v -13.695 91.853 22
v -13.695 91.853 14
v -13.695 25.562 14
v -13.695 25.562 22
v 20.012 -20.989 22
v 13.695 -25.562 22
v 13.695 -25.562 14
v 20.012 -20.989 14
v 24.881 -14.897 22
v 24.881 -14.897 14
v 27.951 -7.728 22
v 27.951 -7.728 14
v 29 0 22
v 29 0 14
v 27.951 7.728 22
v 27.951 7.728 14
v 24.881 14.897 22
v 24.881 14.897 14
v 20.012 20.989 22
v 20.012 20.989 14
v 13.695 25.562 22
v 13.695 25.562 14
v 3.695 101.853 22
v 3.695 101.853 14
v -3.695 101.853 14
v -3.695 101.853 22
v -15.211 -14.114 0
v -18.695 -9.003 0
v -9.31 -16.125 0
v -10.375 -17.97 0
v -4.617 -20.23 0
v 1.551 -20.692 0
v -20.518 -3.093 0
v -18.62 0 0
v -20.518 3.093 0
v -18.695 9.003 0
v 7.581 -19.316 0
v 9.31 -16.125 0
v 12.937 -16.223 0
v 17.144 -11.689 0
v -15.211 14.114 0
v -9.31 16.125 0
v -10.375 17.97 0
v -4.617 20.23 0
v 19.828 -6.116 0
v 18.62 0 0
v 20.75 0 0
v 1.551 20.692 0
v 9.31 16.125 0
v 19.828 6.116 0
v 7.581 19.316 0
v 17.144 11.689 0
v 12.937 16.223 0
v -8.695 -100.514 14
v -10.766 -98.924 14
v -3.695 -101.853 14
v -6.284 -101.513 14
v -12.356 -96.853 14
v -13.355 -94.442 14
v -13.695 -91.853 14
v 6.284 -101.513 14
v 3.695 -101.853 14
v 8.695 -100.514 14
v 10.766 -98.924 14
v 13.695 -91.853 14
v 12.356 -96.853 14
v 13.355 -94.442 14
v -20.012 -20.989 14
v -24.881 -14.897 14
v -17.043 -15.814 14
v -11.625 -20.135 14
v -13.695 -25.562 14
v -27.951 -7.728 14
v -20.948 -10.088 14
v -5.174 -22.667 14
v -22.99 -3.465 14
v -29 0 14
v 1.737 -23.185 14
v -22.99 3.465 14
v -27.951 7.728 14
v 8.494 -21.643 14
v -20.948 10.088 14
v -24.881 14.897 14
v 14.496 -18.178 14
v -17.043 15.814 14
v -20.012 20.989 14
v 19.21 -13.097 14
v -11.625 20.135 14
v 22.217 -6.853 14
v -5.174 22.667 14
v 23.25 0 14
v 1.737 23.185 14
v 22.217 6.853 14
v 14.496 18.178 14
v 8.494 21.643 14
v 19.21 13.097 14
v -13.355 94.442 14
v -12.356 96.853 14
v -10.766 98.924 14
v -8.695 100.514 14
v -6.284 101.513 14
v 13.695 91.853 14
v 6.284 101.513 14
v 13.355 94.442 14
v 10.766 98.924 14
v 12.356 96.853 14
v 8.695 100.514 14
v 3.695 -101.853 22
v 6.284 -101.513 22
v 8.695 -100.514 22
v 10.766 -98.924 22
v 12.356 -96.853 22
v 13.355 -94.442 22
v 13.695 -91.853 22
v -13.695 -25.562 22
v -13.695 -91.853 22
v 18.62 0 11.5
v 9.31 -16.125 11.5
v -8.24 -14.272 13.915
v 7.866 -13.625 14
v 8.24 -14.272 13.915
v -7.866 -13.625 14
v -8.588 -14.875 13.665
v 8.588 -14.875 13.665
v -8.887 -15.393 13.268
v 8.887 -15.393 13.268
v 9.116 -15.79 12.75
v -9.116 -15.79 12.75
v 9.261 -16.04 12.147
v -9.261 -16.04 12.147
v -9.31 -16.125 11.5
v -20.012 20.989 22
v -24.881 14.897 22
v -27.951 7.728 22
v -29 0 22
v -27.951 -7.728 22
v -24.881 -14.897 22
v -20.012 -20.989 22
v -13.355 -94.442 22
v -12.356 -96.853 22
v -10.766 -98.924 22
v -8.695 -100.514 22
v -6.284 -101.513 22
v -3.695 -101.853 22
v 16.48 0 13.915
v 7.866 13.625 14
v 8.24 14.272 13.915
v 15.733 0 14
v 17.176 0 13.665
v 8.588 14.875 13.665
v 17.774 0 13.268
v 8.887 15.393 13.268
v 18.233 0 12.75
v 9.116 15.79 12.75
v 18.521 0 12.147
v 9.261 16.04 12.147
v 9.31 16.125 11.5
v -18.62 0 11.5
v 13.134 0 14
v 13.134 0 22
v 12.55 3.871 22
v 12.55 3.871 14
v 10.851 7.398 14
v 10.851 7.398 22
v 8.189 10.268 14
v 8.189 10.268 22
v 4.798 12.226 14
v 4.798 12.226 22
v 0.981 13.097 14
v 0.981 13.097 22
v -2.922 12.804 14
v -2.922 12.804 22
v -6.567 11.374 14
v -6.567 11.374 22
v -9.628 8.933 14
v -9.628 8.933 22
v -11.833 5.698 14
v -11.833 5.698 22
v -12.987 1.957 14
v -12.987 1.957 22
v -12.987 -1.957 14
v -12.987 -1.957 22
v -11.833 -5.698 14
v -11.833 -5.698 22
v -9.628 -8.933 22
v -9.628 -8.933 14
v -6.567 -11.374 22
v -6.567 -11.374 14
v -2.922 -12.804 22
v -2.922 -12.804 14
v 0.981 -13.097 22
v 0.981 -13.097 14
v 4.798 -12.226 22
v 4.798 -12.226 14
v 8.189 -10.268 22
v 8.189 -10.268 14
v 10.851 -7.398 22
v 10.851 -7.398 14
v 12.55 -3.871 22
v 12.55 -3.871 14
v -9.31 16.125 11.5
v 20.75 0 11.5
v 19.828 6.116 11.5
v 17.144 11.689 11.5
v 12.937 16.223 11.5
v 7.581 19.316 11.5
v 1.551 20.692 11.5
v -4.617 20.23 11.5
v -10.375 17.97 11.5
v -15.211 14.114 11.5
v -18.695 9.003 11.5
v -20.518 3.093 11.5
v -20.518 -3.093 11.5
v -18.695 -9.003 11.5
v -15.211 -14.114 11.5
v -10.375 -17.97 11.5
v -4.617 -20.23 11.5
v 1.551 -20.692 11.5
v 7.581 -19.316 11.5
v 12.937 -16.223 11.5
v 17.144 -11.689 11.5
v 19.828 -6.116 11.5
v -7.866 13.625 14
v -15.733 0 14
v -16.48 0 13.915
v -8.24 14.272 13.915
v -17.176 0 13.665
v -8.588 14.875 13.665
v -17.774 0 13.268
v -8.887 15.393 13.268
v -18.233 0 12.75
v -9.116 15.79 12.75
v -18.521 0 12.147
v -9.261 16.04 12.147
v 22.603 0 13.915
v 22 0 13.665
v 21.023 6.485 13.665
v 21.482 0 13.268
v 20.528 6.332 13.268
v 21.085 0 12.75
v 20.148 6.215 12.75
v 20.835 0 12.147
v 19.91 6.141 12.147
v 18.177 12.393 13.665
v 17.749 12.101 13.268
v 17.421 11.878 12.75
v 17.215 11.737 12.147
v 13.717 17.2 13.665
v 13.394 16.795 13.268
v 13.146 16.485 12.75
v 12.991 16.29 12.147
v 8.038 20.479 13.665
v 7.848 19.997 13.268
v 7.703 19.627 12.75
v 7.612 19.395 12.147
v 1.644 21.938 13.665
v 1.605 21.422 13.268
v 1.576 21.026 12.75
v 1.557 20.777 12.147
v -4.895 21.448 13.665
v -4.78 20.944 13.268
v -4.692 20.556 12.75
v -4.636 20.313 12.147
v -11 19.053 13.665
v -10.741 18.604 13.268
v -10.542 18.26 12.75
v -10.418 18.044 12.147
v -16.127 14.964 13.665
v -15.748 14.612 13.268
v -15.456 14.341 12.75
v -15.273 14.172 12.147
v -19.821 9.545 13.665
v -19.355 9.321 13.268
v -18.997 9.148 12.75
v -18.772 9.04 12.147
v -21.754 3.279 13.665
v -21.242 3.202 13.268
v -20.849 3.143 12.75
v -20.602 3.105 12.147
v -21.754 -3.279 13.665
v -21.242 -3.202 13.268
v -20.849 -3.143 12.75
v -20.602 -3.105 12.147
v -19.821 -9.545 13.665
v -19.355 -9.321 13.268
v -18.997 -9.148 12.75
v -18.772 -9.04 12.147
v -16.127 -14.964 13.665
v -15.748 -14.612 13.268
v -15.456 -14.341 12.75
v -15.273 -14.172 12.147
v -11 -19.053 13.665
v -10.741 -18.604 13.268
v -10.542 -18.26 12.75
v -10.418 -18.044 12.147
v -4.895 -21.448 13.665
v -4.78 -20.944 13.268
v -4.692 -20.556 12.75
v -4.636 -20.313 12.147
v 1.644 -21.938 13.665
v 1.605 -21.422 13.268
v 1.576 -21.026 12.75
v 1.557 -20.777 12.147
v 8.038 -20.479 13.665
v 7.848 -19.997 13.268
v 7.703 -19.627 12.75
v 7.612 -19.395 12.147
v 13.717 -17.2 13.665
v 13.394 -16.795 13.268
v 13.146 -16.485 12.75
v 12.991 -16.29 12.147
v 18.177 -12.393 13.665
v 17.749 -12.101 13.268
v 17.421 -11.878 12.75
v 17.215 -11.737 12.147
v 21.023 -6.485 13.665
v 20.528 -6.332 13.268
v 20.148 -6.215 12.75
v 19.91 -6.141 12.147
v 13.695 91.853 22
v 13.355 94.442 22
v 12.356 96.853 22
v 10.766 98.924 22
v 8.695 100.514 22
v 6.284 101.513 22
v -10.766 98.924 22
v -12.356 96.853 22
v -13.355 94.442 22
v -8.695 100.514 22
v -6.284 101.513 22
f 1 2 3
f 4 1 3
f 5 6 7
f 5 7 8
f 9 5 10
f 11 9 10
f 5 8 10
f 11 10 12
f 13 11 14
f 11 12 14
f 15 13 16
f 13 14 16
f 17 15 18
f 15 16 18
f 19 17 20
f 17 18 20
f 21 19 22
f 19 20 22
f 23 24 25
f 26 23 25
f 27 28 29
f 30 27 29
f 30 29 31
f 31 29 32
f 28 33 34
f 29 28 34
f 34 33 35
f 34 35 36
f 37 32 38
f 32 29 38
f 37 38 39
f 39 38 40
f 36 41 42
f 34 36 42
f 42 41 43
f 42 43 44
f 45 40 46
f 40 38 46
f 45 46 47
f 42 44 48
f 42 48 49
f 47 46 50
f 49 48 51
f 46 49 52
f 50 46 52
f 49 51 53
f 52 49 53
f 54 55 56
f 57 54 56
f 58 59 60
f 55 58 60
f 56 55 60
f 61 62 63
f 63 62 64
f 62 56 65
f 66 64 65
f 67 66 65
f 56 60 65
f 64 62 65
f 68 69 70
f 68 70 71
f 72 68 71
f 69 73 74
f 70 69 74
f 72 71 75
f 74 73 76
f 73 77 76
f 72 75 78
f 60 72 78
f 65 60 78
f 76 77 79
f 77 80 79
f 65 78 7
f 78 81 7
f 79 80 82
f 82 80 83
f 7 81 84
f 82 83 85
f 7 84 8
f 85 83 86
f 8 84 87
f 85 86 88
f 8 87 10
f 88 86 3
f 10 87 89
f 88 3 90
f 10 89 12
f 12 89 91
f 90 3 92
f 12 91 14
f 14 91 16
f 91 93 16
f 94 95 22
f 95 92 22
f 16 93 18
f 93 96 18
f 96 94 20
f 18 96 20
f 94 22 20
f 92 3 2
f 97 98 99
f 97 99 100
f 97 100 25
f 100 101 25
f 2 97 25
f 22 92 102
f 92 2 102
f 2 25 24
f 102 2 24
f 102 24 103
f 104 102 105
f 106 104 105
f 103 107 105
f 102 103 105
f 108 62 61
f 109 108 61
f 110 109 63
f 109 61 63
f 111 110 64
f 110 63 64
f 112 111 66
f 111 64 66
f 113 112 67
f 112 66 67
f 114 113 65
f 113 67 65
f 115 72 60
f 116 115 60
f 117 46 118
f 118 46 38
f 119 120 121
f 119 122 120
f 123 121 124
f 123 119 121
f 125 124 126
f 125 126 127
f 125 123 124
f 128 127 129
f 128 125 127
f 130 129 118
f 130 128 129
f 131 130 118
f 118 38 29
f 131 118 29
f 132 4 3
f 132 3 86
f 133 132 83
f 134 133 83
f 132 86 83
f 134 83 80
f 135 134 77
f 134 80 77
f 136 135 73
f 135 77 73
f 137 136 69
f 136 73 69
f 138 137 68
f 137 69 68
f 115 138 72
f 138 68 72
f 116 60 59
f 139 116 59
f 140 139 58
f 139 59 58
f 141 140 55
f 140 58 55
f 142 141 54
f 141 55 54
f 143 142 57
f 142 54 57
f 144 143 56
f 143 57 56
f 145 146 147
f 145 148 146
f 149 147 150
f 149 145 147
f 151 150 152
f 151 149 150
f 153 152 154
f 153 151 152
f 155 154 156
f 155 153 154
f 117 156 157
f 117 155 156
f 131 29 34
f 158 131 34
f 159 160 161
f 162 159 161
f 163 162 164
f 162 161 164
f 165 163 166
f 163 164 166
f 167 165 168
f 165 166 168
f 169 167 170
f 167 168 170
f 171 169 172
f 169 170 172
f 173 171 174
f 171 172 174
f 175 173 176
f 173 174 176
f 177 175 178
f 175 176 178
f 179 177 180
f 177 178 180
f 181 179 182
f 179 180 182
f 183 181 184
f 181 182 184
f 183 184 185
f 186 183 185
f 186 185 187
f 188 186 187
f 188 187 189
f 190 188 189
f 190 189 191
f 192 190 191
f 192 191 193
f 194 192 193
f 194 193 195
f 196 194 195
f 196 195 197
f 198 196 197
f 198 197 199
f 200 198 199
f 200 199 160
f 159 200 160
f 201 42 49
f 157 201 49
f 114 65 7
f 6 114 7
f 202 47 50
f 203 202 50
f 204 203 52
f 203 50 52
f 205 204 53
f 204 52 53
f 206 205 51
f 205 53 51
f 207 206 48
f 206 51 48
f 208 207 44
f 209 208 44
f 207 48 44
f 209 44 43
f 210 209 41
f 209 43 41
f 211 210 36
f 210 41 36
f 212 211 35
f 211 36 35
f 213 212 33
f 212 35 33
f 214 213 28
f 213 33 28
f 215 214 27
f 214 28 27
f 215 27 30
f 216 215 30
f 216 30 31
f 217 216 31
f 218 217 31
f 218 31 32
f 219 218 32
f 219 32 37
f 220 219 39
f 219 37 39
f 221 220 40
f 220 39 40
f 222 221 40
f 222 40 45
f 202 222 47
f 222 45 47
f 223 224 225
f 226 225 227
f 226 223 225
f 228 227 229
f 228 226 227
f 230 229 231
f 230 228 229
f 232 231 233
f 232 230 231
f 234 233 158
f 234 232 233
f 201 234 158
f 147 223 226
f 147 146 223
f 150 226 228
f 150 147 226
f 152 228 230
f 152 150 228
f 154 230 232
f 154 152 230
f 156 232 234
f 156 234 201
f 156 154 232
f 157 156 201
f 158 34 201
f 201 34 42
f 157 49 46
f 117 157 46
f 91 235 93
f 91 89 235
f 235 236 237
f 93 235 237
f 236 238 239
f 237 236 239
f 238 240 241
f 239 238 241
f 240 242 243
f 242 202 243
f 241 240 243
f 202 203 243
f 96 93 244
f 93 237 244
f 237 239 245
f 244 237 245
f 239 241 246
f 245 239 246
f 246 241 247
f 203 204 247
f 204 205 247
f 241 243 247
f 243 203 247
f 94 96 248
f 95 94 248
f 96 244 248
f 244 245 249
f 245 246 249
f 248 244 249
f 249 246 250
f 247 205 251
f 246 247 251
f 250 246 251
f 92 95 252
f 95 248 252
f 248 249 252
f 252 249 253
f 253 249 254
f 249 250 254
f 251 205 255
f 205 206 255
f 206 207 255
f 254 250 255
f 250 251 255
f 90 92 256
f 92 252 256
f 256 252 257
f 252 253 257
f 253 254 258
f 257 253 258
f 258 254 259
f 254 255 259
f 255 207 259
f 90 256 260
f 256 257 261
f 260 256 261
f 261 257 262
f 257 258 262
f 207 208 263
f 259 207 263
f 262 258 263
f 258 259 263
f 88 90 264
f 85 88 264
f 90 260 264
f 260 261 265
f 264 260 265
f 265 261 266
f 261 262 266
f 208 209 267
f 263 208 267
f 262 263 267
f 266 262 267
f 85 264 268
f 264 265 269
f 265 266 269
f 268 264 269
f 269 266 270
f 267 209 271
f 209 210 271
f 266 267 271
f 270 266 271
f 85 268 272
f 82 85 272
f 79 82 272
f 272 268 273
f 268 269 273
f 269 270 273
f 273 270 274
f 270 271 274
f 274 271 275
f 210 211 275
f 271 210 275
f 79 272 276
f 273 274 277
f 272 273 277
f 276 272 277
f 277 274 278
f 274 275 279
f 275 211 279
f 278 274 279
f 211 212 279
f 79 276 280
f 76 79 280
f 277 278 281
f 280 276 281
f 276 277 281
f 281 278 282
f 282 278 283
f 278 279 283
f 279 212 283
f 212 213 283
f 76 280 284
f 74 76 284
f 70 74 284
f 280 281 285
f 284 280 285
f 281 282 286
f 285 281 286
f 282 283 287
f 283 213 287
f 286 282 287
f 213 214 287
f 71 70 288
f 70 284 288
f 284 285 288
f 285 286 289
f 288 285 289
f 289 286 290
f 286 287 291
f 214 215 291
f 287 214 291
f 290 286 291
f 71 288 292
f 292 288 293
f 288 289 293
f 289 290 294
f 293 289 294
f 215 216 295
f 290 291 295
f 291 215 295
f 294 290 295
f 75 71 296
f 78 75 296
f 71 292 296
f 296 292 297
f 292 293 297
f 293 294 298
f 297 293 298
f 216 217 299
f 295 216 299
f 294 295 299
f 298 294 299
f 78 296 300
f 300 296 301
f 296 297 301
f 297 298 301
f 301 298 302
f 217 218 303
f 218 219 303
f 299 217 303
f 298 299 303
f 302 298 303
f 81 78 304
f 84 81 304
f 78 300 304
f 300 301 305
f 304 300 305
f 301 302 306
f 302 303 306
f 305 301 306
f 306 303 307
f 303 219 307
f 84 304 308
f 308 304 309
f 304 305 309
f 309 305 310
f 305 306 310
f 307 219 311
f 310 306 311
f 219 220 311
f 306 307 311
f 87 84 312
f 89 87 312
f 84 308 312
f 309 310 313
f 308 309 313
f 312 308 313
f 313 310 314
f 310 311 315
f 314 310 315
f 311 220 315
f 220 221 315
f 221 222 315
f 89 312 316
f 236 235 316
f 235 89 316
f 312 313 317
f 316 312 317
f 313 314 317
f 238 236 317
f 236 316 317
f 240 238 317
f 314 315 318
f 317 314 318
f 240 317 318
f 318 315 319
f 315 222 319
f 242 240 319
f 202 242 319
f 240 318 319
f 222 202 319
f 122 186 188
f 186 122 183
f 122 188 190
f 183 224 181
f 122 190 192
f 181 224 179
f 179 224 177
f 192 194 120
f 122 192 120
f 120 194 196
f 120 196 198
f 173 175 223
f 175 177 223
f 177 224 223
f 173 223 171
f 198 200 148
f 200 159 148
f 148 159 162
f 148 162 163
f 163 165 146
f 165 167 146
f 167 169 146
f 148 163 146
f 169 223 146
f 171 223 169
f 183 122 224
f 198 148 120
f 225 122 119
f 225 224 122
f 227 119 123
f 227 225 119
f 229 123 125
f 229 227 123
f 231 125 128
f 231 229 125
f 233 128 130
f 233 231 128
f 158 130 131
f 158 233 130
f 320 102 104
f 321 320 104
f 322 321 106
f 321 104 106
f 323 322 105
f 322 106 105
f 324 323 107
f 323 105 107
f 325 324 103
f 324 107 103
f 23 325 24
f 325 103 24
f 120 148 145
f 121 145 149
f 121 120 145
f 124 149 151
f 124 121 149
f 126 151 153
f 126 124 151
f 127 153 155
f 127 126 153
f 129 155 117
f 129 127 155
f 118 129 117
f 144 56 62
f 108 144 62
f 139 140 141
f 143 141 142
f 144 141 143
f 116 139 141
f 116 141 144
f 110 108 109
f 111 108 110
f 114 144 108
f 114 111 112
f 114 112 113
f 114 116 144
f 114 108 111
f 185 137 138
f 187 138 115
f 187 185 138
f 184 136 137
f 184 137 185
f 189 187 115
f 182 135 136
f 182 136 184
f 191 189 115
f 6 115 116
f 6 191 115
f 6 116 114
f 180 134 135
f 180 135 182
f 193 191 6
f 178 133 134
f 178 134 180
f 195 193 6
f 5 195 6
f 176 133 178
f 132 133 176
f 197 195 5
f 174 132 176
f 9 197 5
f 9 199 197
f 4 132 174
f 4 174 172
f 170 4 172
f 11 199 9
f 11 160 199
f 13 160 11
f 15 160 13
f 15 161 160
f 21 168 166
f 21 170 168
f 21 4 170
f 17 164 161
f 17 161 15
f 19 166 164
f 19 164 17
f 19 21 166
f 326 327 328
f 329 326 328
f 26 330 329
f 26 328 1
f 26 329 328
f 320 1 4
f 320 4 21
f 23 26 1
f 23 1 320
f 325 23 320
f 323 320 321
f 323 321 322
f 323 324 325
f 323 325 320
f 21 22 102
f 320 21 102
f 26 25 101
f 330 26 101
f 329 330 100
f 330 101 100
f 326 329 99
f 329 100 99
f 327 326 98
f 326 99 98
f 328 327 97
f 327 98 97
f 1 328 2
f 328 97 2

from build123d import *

# Parameters (mm, degrees)
F0_R     = 20.75
F1_DEPTH = 14
F3_DEPTH = 8
F4_R     = 13.133574
F5_DEPTH = 25
F6_R     = 2.5


with BuildPart() as f1:
    # F0 (on Top) → F1 (new body)
    with BuildSketch(Plane.XY):
        Circle(F0_R)
        Polygon((-18.619546, 0), (-9.309773, 16.125), (9.309773, 16.125), (18.619546, 0), (9.309773, -16.125), (-9.309773, -16.125), align=None, mode=Mode.SUBTRACT)
    extrude(amount=F1_DEPTH)

    # F2 (on face) → F3 (join)
    with BuildSketch(Plane.XY.offset(14)):
        with BuildLine():
            Line((-13.69534, 91.853356), (-13.69534, 25.562427))
            ThreePointArc((-13.69534, 25.562427), (-29, 0), (-13.69534, -25.562427))
            Line((-13.69534, -25.562427), (-13.69534, -91.853356))
            ThreePointArc((-13.69534, -91.853356), (-10.766407, -98.924424), (-3.69534, -101.853356))
            Line((-3.69534, -101.853356), (3.69534, -101.853356))
            ThreePointArc((3.69534, -101.853356), (10.766407, -98.924424), (13.69534, -91.853356))
            Line((13.69534, -91.853356), (13.69534, -25.562427))
            ThreePointArc((13.69534, -25.562427), (29, 0), (13.69534, 25.562427))
            Line((13.69534, 25.562427), (13.69534, 91.853356))
            ThreePointArc((13.69534, 91.853356), (10.766407, 98.924424), (3.69534, 101.853356))
            Line((3.69534, 101.853356), (-3.69534, 101.853356))
            ThreePointArc((-3.69534, 101.853356), (-10.766407, 98.924424), (-13.69534, 91.853356))
        make_face()
    extrude(amount=F3_DEPTH)

    # F4 (on face) → F5 (cut)
    with BuildSketch(Plane.XY.offset(22)):
        Circle(F4_R)
    extrude(amount=-F5_DEPTH, mode=Mode.SUBTRACT)

    # F6
    f6_edges = [f1.edges().sort_by_distance(p)[0] for p in [
        (0, 16.125, 14),
        (-13.96466, 8.0625, 14),
        (-13.96466, -8.0625, 14),
        (0, -16.125, 14),
        (13.96466, -8.0625, 14),
        (13.96466, 8.0625, 14),
        (-20.75, 0, 14),
    ]]
    fillet(f6_edges, radius=F6_R)


solid = f1.part
